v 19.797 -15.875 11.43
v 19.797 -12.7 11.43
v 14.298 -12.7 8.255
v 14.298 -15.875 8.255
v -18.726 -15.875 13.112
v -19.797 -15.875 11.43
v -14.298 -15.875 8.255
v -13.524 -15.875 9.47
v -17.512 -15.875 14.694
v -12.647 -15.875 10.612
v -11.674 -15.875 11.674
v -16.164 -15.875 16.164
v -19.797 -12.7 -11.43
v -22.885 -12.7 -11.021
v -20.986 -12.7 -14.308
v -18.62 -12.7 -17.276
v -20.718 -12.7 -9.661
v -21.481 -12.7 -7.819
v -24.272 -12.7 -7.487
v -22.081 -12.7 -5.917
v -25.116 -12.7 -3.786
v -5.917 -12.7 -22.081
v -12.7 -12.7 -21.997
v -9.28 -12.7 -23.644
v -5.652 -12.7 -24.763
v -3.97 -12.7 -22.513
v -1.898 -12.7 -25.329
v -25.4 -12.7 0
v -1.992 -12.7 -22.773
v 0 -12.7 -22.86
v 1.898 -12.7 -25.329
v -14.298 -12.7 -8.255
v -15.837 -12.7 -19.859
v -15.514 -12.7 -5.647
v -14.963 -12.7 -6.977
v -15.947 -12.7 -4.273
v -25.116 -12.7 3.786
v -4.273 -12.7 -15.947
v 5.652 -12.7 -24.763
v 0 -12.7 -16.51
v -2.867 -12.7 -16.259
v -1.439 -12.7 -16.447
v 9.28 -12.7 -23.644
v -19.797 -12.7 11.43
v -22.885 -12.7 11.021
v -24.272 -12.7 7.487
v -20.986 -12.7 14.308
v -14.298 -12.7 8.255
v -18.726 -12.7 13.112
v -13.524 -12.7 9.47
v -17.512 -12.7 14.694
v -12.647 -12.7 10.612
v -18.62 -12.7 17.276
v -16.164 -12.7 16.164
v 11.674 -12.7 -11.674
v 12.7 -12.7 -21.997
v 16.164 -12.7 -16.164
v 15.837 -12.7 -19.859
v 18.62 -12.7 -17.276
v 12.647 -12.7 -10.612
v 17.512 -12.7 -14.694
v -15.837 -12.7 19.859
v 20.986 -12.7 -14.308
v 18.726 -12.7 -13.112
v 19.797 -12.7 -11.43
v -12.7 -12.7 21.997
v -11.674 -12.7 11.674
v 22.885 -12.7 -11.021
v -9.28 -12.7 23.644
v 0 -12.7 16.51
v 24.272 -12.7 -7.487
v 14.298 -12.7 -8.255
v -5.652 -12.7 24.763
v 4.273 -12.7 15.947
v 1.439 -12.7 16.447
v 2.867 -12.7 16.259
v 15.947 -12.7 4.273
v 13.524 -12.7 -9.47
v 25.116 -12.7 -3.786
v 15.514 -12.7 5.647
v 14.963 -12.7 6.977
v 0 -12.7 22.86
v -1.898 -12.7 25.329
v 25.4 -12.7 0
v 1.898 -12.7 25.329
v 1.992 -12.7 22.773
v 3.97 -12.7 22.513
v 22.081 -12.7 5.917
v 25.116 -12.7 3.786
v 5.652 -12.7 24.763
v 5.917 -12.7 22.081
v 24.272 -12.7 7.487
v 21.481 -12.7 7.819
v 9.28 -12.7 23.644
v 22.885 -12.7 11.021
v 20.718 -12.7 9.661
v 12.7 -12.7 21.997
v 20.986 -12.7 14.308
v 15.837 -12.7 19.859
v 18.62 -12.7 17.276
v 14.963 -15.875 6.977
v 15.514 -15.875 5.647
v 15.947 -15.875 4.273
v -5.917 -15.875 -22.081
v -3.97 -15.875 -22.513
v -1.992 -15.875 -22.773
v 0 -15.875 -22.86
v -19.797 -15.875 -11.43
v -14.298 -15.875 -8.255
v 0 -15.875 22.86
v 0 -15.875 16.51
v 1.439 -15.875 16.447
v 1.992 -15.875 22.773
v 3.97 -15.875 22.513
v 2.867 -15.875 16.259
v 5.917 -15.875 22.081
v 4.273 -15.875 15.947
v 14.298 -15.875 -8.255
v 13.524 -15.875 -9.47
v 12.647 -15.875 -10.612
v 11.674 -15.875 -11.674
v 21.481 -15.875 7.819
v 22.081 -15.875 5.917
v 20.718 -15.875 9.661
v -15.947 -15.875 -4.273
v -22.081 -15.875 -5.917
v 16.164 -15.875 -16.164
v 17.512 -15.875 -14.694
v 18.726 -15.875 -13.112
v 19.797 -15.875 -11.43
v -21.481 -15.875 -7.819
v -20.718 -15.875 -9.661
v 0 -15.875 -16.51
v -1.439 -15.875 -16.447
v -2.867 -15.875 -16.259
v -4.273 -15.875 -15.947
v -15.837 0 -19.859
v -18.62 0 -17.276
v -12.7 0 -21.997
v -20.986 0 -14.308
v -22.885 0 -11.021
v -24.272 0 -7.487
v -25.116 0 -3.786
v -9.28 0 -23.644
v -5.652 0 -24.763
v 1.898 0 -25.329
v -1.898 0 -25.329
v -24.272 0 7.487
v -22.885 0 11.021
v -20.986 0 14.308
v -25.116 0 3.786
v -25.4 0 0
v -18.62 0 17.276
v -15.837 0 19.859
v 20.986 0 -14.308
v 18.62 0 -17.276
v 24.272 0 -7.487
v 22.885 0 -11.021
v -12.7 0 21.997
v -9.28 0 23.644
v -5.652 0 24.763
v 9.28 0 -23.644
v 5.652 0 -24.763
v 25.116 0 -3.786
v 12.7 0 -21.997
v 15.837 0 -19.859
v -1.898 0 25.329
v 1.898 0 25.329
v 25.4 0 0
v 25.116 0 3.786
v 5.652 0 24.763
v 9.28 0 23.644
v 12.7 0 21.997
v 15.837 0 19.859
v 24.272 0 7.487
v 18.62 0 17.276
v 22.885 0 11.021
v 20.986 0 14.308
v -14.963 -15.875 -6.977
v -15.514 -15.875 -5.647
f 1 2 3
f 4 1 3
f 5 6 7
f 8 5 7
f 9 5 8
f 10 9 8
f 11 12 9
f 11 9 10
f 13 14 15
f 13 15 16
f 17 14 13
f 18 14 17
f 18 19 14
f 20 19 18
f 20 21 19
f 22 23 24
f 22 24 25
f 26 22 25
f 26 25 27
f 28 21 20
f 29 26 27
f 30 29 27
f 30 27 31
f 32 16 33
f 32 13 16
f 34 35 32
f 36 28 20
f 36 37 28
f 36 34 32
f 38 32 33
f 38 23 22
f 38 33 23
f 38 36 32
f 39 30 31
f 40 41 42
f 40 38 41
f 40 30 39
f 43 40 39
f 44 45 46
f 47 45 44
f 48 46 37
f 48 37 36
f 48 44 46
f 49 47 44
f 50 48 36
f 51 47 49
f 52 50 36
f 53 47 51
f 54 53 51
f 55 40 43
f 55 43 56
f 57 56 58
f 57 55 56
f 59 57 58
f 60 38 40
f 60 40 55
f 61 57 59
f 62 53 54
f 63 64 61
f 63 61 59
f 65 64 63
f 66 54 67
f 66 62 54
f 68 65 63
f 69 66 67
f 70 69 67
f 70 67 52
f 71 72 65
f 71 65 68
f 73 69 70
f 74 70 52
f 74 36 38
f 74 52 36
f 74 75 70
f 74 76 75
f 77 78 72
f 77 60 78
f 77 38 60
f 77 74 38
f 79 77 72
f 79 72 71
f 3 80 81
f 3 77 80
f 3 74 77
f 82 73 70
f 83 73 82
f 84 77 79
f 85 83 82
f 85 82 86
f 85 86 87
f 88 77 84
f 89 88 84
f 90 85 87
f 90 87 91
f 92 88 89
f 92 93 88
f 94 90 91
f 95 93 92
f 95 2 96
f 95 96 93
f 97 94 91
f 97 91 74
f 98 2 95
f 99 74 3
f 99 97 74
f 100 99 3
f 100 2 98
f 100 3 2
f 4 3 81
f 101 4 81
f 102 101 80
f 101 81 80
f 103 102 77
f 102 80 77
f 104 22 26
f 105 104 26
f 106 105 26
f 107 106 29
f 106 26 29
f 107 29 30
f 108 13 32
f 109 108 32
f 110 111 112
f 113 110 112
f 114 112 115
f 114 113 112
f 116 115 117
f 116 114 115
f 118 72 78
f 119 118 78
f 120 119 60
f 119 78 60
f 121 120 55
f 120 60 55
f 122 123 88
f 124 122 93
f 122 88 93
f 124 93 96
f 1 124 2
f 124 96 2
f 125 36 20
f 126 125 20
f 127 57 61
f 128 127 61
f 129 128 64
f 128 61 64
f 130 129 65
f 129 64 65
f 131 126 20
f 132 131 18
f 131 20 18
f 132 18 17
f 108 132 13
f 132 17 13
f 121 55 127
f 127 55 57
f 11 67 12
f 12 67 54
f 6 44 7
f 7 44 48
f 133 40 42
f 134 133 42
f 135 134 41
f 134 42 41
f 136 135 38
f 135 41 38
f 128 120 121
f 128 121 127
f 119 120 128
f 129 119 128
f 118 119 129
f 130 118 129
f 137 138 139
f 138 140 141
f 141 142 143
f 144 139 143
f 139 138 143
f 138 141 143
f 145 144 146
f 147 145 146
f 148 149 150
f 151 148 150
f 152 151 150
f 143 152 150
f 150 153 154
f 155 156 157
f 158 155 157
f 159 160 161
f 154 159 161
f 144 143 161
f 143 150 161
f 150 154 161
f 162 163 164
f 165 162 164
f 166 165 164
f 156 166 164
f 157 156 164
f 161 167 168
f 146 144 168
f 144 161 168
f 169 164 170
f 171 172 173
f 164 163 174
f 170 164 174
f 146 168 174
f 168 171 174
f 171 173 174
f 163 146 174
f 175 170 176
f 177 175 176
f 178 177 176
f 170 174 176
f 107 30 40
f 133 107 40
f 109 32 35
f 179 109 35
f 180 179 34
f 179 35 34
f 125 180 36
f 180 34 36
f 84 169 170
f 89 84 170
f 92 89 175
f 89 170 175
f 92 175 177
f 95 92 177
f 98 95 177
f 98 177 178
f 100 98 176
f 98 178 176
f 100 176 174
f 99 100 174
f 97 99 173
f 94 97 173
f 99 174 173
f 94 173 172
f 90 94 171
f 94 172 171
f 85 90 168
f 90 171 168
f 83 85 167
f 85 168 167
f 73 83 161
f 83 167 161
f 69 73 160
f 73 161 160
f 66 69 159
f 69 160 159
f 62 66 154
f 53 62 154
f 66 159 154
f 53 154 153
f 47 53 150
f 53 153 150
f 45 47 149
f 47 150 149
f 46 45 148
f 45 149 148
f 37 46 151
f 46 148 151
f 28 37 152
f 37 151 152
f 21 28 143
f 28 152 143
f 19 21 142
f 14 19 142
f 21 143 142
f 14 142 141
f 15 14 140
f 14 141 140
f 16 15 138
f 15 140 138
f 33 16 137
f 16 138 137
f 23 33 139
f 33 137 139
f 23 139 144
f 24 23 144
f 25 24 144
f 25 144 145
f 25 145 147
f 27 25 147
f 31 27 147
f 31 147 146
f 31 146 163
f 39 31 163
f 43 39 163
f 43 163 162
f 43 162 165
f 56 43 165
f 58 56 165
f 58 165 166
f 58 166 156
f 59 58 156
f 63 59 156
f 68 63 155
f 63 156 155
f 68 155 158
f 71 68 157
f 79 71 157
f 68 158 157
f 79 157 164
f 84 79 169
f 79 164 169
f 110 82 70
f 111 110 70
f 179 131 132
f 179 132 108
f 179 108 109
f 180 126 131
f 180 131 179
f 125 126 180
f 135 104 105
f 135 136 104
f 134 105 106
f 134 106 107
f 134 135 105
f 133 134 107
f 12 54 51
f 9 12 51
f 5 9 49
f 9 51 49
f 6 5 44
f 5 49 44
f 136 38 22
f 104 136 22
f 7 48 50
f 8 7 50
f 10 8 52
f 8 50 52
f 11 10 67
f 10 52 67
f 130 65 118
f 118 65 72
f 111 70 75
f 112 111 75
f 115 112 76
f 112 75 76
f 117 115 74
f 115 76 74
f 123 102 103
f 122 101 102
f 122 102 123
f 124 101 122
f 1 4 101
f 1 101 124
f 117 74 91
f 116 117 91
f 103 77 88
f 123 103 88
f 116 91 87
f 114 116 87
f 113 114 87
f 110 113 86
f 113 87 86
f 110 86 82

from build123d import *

# Parameters (mm, degrees)
F0_R     = 25.4
F1_DEPTH = 12.7
F2_DEPTH = 15.875


# Not quite as in the source:
# - a length typed as a fraction of an inch, garbled in the dataset ("3 / 203.2 mm" for 3/8 in), is restored
# - a feature names something its author has since deleted; it is built from what else it names


with BuildPart() as f1:
    # F0 (on Front) → F1 (new body)
    with BuildSketch(Plane.XZ):
        Circle(F0_R)
        with BuildLine():
            Line((0, -16.51), (0, -22.86))
            ThreePointArc((0, -22.86), (-2.9838287542, -22.664429531), (-5.916603371, -22.081064389))
            Line((-5.916603371, -22.081064389), (-4.2731024346, -15.947435392))
            ThreePointArc((-4.2731024346, -15.947435392), (-2.1549874336, -16.3687546613), (0, -16.51))
        make_face(mode=Mode.SUBTRACT)
        with BuildLine():
            Line((-14.2980794165, -8.255), (-19.7973407305, -11.43))
            ThreePointArc((-19.7973407305, -11.43), (-21.1198861132, -8.7481432639), (-22.081064389, -5.916603371))
            Line((-22.081064389, -5.916603371), (-15.947435392, -4.2731024346))
            ThreePointArc((-15.947435392, -4.2731024346), (-15.2532510818, -6.3181034683), (-14.2980794165, -8.255))
        make_face(mode=Mode.SUBTRACT)
        with BuildLine():
            Line((14.2980794165, -8.255), (19.7973407305, -11.43))
            ThreePointArc((19.7973407305, -11.43), (18.1360573591, -13.9162862671), (16.1644610179, -16.1644610179))
            Line((16.1644610179, -16.1644610179), (11.6743329574, -11.6743329574))
            ThreePointArc((11.6743329574, -11.6743329574), (13.0982636482, -10.0506511929), (14.2980794165, -8.255))
        make_face(mode=Mode.SUBTRACT)
        with BuildLine():
            Line((-14.2980794165, 8.255), (-19.7973407305, 11.43))
            ThreePointArc((-19.7973407305, 11.43), (-18.1360573591, 13.9162862671), (-16.1644610179, 16.1644610179))
            Line((-16.1644610179, 16.1644610179), (-11.6743329574, 11.6743329574))
            ThreePointArc((-11.6743329574, 11.6743329574), (-13.0982636482, 10.0506511929), (-14.2980794165, 8.255))
        make_face(mode=Mode.SUBTRACT)
        with BuildLine():
            Line((14.2980794165, 8.255), (19.7973407305, 11.43))
            ThreePointArc((19.7973407305, 11.43), (21.1198861132, 8.7481432639), (22.081064389, 5.916603371))
            Line((22.081064389, 5.916603371), (15.947435392, 4.2731024346))
            ThreePointArc((15.947435392, 4.2731024346), (15.2532510818, 6.3181034683), (14.2980794165, 8.255))
        make_face(mode=Mode.SUBTRACT)
        with BuildLine():
            Line((0, 16.51), (0, 22.86))
            ThreePointArc((0, 22.86), (2.9838287542, 22.664429531), (5.916603371, 22.081064389))
            Line((5.916603371, 22.081064389), (4.2731024346, 15.947435392))
            ThreePointArc((4.2731024346, 15.947435392), (2.1549874336, 16.3687546613), (0, 16.51))
        make_face(mode=Mode.SUBTRACT)
        with BuildLine():
            ThreePointArc((5.916603371, 22.081064389), (2.9838287542, 22.664429531), (0, 22.86))
            Line((0, 22.86), (0, 16.51))
            ThreePointArc((0, 16.51), (2.1549874336, 16.3687546613), (4.2731024346, 15.947435392))
            Line((4.2731024346, 15.947435392), (5.916603371, 22.081064389))
        make_face()
        with BuildLine():
            ThreePointArc((-16.1644610179, 16.1644610179), (-18.1360573591, 13.9162862671), (-19.7973407305, 11.43))
            Line((-19.7973407305, 11.43), (-14.2980794165, 8.255))
            ThreePointArc((-14.2980794165, 8.255), (-13.0982636482, 10.0506511929), (-11.6743329574, 11.6743329574))
            Line((-11.6743329574, 11.6743329574), (-16.1644610179, 16.1644610179))
        make_face()
        with BuildLine():
            ThreePointArc((-22.081064389, -5.916603371), (-21.1198861132, -8.7481432639), (-19.7973407305, -11.43))
            Line((-19.7973407305, -11.43), (-14.2980794165, -8.255))
            ThreePointArc((-14.2980794165, -8.255), (-15.2532510818, -6.3181034683), (-15.947435392, -4.2731024346))
            Line((-15.947435392, -4.2731024346), (-22.081064389, -5.916603371))
        make_face()
        with BuildLine():
            ThreePointArc((16.1644610179, -16.1644610179), (18.1360573591, -13.9162862671), (19.7973407305, -11.43))
            Line((19.7973407305, -11.43), (14.2980794165, -8.255))
            ThreePointArc((14.2980794165, -8.255), (13.0982636482, -10.0506511929), (11.6743329574, -11.6743329574))
            Line((11.6743329574, -11.6743329574), (16.1644610179, -16.1644610179))
        make_face()
        with BuildLine():
            ThreePointArc((22.081064389, 5.916603371), (21.1198861132, 8.7481432639), (19.7973407305, 11.43))
            Line((19.7973407305, 11.43), (14.2980794165, 8.255))
            ThreePointArc((14.2980794165, 8.255), (15.2532510818, 6.3181034683), (15.947435392, 4.2731024346))
            Line((15.947435392, 4.2731024346), (22.081064389, 5.916603371))
        make_face()
        with BuildLine():
            ThreePointArc((-5.916603371, -22.081064389), (-2.9838287542, -22.664429531), (0, -22.86))
            Line((0, -22.86), (0, -16.51))
            ThreePointArc((0, -16.51), (-2.1549874336, -16.3687546613), (-4.2731024346, -15.947435392))
            Line((-4.2731024346, -15.947435392), (-5.916603371, -22.081064389))
        make_face()
    extrude(amount=F1_DEPTH)

    # F0 (on Front) → F2 (join)
    with BuildSketch(Plane.XZ):
        with BuildLine():
            ThreePointArc((22.081064389, 5.916603371), (21.1198861132, 8.7481432639), (19.7973407305, 11.43))
            Line((19.7973407305, 11.43), (14.2980794165, 8.255))
            ThreePointArc((14.2980794165, 8.255), (15.2532510818, 6.3181034683), (15.947435392, 4.2731024346))
            Line((15.947435392, 4.2731024346), (22.081064389, 5.916603371))
        make_face()
        with BuildLine():
            ThreePointArc((16.1644610179, -16.1644610179), (18.1360573591, -13.9162862671), (19.7973407305, -11.43))
            Line((19.7973407305, -11.43), (14.2980794165, -8.255))
            ThreePointArc((14.2980794165, -8.255), (13.0982636482, -10.0506511929), (11.6743329574, -11.6743329574))
            Line((11.6743329574, -11.6743329574), (16.1644610179, -16.1644610179))
        make_face()
        with BuildLine():
            ThreePointArc((-5.916603371, -22.081064389), (-2.9838287542, -22.664429531), (0, -22.86))
            Line((0, -22.86), (0, -16.51))
            ThreePointArc((0, -16.51), (-2.1549874336, -16.3687546613), (-4.2731024346, -15.947435392))
            Line((-4.2731024346, -15.947435392), (-5.916603371, -22.081064389))
        make_face()
        with BuildLine():
            ThreePointArc((-16.1644610179, 16.1644610179), (-18.1360573591, 13.9162862671), (-19.7973407305, 11.43))
            Line((-19.7973407305, 11.43), (-14.2980794165, 8.255))
            ThreePointArc((-14.2980794165, 8.255), (-13.0982636482, 10.0506511929), (-11.6743329574, 11.6743329574))
            Line((-11.6743329574, 11.6743329574), (-16.1644610179, 16.1644610179))
        make_face()
        with BuildLine():
            ThreePointArc((5.916603371, 22.081064389), (2.9838287542, 22.664429531), (0, 22.86))
            Line((0, 22.86), (0, 16.51))
            ThreePointArc((0, 16.51), (2.1549874336, 16.3687546613), (4.2731024346, 15.947435392))
            Line((4.2731024346, 15.947435392), (5.916603371, 22.081064389))
        make_face()
        with BuildLine():
            ThreePointArc((-22.081064389, -5.916603371), (-21.1198861132, -8.7481432639), (-19.7973407305, -11.43))
            Line((-19.7973407305, -11.43), (-14.2980794165, -8.255))
            ThreePointArc((-14.2980794165, -8.255), (-15.2532510818, -6.3181034683), (-15.947435392, -4.2731024346))
            Line((-15.947435392, -4.2731024346), (-22.081064389, -5.916603371))
        make_face()
    extrude(amount=F2_DEPTH)


solid = f1.part
